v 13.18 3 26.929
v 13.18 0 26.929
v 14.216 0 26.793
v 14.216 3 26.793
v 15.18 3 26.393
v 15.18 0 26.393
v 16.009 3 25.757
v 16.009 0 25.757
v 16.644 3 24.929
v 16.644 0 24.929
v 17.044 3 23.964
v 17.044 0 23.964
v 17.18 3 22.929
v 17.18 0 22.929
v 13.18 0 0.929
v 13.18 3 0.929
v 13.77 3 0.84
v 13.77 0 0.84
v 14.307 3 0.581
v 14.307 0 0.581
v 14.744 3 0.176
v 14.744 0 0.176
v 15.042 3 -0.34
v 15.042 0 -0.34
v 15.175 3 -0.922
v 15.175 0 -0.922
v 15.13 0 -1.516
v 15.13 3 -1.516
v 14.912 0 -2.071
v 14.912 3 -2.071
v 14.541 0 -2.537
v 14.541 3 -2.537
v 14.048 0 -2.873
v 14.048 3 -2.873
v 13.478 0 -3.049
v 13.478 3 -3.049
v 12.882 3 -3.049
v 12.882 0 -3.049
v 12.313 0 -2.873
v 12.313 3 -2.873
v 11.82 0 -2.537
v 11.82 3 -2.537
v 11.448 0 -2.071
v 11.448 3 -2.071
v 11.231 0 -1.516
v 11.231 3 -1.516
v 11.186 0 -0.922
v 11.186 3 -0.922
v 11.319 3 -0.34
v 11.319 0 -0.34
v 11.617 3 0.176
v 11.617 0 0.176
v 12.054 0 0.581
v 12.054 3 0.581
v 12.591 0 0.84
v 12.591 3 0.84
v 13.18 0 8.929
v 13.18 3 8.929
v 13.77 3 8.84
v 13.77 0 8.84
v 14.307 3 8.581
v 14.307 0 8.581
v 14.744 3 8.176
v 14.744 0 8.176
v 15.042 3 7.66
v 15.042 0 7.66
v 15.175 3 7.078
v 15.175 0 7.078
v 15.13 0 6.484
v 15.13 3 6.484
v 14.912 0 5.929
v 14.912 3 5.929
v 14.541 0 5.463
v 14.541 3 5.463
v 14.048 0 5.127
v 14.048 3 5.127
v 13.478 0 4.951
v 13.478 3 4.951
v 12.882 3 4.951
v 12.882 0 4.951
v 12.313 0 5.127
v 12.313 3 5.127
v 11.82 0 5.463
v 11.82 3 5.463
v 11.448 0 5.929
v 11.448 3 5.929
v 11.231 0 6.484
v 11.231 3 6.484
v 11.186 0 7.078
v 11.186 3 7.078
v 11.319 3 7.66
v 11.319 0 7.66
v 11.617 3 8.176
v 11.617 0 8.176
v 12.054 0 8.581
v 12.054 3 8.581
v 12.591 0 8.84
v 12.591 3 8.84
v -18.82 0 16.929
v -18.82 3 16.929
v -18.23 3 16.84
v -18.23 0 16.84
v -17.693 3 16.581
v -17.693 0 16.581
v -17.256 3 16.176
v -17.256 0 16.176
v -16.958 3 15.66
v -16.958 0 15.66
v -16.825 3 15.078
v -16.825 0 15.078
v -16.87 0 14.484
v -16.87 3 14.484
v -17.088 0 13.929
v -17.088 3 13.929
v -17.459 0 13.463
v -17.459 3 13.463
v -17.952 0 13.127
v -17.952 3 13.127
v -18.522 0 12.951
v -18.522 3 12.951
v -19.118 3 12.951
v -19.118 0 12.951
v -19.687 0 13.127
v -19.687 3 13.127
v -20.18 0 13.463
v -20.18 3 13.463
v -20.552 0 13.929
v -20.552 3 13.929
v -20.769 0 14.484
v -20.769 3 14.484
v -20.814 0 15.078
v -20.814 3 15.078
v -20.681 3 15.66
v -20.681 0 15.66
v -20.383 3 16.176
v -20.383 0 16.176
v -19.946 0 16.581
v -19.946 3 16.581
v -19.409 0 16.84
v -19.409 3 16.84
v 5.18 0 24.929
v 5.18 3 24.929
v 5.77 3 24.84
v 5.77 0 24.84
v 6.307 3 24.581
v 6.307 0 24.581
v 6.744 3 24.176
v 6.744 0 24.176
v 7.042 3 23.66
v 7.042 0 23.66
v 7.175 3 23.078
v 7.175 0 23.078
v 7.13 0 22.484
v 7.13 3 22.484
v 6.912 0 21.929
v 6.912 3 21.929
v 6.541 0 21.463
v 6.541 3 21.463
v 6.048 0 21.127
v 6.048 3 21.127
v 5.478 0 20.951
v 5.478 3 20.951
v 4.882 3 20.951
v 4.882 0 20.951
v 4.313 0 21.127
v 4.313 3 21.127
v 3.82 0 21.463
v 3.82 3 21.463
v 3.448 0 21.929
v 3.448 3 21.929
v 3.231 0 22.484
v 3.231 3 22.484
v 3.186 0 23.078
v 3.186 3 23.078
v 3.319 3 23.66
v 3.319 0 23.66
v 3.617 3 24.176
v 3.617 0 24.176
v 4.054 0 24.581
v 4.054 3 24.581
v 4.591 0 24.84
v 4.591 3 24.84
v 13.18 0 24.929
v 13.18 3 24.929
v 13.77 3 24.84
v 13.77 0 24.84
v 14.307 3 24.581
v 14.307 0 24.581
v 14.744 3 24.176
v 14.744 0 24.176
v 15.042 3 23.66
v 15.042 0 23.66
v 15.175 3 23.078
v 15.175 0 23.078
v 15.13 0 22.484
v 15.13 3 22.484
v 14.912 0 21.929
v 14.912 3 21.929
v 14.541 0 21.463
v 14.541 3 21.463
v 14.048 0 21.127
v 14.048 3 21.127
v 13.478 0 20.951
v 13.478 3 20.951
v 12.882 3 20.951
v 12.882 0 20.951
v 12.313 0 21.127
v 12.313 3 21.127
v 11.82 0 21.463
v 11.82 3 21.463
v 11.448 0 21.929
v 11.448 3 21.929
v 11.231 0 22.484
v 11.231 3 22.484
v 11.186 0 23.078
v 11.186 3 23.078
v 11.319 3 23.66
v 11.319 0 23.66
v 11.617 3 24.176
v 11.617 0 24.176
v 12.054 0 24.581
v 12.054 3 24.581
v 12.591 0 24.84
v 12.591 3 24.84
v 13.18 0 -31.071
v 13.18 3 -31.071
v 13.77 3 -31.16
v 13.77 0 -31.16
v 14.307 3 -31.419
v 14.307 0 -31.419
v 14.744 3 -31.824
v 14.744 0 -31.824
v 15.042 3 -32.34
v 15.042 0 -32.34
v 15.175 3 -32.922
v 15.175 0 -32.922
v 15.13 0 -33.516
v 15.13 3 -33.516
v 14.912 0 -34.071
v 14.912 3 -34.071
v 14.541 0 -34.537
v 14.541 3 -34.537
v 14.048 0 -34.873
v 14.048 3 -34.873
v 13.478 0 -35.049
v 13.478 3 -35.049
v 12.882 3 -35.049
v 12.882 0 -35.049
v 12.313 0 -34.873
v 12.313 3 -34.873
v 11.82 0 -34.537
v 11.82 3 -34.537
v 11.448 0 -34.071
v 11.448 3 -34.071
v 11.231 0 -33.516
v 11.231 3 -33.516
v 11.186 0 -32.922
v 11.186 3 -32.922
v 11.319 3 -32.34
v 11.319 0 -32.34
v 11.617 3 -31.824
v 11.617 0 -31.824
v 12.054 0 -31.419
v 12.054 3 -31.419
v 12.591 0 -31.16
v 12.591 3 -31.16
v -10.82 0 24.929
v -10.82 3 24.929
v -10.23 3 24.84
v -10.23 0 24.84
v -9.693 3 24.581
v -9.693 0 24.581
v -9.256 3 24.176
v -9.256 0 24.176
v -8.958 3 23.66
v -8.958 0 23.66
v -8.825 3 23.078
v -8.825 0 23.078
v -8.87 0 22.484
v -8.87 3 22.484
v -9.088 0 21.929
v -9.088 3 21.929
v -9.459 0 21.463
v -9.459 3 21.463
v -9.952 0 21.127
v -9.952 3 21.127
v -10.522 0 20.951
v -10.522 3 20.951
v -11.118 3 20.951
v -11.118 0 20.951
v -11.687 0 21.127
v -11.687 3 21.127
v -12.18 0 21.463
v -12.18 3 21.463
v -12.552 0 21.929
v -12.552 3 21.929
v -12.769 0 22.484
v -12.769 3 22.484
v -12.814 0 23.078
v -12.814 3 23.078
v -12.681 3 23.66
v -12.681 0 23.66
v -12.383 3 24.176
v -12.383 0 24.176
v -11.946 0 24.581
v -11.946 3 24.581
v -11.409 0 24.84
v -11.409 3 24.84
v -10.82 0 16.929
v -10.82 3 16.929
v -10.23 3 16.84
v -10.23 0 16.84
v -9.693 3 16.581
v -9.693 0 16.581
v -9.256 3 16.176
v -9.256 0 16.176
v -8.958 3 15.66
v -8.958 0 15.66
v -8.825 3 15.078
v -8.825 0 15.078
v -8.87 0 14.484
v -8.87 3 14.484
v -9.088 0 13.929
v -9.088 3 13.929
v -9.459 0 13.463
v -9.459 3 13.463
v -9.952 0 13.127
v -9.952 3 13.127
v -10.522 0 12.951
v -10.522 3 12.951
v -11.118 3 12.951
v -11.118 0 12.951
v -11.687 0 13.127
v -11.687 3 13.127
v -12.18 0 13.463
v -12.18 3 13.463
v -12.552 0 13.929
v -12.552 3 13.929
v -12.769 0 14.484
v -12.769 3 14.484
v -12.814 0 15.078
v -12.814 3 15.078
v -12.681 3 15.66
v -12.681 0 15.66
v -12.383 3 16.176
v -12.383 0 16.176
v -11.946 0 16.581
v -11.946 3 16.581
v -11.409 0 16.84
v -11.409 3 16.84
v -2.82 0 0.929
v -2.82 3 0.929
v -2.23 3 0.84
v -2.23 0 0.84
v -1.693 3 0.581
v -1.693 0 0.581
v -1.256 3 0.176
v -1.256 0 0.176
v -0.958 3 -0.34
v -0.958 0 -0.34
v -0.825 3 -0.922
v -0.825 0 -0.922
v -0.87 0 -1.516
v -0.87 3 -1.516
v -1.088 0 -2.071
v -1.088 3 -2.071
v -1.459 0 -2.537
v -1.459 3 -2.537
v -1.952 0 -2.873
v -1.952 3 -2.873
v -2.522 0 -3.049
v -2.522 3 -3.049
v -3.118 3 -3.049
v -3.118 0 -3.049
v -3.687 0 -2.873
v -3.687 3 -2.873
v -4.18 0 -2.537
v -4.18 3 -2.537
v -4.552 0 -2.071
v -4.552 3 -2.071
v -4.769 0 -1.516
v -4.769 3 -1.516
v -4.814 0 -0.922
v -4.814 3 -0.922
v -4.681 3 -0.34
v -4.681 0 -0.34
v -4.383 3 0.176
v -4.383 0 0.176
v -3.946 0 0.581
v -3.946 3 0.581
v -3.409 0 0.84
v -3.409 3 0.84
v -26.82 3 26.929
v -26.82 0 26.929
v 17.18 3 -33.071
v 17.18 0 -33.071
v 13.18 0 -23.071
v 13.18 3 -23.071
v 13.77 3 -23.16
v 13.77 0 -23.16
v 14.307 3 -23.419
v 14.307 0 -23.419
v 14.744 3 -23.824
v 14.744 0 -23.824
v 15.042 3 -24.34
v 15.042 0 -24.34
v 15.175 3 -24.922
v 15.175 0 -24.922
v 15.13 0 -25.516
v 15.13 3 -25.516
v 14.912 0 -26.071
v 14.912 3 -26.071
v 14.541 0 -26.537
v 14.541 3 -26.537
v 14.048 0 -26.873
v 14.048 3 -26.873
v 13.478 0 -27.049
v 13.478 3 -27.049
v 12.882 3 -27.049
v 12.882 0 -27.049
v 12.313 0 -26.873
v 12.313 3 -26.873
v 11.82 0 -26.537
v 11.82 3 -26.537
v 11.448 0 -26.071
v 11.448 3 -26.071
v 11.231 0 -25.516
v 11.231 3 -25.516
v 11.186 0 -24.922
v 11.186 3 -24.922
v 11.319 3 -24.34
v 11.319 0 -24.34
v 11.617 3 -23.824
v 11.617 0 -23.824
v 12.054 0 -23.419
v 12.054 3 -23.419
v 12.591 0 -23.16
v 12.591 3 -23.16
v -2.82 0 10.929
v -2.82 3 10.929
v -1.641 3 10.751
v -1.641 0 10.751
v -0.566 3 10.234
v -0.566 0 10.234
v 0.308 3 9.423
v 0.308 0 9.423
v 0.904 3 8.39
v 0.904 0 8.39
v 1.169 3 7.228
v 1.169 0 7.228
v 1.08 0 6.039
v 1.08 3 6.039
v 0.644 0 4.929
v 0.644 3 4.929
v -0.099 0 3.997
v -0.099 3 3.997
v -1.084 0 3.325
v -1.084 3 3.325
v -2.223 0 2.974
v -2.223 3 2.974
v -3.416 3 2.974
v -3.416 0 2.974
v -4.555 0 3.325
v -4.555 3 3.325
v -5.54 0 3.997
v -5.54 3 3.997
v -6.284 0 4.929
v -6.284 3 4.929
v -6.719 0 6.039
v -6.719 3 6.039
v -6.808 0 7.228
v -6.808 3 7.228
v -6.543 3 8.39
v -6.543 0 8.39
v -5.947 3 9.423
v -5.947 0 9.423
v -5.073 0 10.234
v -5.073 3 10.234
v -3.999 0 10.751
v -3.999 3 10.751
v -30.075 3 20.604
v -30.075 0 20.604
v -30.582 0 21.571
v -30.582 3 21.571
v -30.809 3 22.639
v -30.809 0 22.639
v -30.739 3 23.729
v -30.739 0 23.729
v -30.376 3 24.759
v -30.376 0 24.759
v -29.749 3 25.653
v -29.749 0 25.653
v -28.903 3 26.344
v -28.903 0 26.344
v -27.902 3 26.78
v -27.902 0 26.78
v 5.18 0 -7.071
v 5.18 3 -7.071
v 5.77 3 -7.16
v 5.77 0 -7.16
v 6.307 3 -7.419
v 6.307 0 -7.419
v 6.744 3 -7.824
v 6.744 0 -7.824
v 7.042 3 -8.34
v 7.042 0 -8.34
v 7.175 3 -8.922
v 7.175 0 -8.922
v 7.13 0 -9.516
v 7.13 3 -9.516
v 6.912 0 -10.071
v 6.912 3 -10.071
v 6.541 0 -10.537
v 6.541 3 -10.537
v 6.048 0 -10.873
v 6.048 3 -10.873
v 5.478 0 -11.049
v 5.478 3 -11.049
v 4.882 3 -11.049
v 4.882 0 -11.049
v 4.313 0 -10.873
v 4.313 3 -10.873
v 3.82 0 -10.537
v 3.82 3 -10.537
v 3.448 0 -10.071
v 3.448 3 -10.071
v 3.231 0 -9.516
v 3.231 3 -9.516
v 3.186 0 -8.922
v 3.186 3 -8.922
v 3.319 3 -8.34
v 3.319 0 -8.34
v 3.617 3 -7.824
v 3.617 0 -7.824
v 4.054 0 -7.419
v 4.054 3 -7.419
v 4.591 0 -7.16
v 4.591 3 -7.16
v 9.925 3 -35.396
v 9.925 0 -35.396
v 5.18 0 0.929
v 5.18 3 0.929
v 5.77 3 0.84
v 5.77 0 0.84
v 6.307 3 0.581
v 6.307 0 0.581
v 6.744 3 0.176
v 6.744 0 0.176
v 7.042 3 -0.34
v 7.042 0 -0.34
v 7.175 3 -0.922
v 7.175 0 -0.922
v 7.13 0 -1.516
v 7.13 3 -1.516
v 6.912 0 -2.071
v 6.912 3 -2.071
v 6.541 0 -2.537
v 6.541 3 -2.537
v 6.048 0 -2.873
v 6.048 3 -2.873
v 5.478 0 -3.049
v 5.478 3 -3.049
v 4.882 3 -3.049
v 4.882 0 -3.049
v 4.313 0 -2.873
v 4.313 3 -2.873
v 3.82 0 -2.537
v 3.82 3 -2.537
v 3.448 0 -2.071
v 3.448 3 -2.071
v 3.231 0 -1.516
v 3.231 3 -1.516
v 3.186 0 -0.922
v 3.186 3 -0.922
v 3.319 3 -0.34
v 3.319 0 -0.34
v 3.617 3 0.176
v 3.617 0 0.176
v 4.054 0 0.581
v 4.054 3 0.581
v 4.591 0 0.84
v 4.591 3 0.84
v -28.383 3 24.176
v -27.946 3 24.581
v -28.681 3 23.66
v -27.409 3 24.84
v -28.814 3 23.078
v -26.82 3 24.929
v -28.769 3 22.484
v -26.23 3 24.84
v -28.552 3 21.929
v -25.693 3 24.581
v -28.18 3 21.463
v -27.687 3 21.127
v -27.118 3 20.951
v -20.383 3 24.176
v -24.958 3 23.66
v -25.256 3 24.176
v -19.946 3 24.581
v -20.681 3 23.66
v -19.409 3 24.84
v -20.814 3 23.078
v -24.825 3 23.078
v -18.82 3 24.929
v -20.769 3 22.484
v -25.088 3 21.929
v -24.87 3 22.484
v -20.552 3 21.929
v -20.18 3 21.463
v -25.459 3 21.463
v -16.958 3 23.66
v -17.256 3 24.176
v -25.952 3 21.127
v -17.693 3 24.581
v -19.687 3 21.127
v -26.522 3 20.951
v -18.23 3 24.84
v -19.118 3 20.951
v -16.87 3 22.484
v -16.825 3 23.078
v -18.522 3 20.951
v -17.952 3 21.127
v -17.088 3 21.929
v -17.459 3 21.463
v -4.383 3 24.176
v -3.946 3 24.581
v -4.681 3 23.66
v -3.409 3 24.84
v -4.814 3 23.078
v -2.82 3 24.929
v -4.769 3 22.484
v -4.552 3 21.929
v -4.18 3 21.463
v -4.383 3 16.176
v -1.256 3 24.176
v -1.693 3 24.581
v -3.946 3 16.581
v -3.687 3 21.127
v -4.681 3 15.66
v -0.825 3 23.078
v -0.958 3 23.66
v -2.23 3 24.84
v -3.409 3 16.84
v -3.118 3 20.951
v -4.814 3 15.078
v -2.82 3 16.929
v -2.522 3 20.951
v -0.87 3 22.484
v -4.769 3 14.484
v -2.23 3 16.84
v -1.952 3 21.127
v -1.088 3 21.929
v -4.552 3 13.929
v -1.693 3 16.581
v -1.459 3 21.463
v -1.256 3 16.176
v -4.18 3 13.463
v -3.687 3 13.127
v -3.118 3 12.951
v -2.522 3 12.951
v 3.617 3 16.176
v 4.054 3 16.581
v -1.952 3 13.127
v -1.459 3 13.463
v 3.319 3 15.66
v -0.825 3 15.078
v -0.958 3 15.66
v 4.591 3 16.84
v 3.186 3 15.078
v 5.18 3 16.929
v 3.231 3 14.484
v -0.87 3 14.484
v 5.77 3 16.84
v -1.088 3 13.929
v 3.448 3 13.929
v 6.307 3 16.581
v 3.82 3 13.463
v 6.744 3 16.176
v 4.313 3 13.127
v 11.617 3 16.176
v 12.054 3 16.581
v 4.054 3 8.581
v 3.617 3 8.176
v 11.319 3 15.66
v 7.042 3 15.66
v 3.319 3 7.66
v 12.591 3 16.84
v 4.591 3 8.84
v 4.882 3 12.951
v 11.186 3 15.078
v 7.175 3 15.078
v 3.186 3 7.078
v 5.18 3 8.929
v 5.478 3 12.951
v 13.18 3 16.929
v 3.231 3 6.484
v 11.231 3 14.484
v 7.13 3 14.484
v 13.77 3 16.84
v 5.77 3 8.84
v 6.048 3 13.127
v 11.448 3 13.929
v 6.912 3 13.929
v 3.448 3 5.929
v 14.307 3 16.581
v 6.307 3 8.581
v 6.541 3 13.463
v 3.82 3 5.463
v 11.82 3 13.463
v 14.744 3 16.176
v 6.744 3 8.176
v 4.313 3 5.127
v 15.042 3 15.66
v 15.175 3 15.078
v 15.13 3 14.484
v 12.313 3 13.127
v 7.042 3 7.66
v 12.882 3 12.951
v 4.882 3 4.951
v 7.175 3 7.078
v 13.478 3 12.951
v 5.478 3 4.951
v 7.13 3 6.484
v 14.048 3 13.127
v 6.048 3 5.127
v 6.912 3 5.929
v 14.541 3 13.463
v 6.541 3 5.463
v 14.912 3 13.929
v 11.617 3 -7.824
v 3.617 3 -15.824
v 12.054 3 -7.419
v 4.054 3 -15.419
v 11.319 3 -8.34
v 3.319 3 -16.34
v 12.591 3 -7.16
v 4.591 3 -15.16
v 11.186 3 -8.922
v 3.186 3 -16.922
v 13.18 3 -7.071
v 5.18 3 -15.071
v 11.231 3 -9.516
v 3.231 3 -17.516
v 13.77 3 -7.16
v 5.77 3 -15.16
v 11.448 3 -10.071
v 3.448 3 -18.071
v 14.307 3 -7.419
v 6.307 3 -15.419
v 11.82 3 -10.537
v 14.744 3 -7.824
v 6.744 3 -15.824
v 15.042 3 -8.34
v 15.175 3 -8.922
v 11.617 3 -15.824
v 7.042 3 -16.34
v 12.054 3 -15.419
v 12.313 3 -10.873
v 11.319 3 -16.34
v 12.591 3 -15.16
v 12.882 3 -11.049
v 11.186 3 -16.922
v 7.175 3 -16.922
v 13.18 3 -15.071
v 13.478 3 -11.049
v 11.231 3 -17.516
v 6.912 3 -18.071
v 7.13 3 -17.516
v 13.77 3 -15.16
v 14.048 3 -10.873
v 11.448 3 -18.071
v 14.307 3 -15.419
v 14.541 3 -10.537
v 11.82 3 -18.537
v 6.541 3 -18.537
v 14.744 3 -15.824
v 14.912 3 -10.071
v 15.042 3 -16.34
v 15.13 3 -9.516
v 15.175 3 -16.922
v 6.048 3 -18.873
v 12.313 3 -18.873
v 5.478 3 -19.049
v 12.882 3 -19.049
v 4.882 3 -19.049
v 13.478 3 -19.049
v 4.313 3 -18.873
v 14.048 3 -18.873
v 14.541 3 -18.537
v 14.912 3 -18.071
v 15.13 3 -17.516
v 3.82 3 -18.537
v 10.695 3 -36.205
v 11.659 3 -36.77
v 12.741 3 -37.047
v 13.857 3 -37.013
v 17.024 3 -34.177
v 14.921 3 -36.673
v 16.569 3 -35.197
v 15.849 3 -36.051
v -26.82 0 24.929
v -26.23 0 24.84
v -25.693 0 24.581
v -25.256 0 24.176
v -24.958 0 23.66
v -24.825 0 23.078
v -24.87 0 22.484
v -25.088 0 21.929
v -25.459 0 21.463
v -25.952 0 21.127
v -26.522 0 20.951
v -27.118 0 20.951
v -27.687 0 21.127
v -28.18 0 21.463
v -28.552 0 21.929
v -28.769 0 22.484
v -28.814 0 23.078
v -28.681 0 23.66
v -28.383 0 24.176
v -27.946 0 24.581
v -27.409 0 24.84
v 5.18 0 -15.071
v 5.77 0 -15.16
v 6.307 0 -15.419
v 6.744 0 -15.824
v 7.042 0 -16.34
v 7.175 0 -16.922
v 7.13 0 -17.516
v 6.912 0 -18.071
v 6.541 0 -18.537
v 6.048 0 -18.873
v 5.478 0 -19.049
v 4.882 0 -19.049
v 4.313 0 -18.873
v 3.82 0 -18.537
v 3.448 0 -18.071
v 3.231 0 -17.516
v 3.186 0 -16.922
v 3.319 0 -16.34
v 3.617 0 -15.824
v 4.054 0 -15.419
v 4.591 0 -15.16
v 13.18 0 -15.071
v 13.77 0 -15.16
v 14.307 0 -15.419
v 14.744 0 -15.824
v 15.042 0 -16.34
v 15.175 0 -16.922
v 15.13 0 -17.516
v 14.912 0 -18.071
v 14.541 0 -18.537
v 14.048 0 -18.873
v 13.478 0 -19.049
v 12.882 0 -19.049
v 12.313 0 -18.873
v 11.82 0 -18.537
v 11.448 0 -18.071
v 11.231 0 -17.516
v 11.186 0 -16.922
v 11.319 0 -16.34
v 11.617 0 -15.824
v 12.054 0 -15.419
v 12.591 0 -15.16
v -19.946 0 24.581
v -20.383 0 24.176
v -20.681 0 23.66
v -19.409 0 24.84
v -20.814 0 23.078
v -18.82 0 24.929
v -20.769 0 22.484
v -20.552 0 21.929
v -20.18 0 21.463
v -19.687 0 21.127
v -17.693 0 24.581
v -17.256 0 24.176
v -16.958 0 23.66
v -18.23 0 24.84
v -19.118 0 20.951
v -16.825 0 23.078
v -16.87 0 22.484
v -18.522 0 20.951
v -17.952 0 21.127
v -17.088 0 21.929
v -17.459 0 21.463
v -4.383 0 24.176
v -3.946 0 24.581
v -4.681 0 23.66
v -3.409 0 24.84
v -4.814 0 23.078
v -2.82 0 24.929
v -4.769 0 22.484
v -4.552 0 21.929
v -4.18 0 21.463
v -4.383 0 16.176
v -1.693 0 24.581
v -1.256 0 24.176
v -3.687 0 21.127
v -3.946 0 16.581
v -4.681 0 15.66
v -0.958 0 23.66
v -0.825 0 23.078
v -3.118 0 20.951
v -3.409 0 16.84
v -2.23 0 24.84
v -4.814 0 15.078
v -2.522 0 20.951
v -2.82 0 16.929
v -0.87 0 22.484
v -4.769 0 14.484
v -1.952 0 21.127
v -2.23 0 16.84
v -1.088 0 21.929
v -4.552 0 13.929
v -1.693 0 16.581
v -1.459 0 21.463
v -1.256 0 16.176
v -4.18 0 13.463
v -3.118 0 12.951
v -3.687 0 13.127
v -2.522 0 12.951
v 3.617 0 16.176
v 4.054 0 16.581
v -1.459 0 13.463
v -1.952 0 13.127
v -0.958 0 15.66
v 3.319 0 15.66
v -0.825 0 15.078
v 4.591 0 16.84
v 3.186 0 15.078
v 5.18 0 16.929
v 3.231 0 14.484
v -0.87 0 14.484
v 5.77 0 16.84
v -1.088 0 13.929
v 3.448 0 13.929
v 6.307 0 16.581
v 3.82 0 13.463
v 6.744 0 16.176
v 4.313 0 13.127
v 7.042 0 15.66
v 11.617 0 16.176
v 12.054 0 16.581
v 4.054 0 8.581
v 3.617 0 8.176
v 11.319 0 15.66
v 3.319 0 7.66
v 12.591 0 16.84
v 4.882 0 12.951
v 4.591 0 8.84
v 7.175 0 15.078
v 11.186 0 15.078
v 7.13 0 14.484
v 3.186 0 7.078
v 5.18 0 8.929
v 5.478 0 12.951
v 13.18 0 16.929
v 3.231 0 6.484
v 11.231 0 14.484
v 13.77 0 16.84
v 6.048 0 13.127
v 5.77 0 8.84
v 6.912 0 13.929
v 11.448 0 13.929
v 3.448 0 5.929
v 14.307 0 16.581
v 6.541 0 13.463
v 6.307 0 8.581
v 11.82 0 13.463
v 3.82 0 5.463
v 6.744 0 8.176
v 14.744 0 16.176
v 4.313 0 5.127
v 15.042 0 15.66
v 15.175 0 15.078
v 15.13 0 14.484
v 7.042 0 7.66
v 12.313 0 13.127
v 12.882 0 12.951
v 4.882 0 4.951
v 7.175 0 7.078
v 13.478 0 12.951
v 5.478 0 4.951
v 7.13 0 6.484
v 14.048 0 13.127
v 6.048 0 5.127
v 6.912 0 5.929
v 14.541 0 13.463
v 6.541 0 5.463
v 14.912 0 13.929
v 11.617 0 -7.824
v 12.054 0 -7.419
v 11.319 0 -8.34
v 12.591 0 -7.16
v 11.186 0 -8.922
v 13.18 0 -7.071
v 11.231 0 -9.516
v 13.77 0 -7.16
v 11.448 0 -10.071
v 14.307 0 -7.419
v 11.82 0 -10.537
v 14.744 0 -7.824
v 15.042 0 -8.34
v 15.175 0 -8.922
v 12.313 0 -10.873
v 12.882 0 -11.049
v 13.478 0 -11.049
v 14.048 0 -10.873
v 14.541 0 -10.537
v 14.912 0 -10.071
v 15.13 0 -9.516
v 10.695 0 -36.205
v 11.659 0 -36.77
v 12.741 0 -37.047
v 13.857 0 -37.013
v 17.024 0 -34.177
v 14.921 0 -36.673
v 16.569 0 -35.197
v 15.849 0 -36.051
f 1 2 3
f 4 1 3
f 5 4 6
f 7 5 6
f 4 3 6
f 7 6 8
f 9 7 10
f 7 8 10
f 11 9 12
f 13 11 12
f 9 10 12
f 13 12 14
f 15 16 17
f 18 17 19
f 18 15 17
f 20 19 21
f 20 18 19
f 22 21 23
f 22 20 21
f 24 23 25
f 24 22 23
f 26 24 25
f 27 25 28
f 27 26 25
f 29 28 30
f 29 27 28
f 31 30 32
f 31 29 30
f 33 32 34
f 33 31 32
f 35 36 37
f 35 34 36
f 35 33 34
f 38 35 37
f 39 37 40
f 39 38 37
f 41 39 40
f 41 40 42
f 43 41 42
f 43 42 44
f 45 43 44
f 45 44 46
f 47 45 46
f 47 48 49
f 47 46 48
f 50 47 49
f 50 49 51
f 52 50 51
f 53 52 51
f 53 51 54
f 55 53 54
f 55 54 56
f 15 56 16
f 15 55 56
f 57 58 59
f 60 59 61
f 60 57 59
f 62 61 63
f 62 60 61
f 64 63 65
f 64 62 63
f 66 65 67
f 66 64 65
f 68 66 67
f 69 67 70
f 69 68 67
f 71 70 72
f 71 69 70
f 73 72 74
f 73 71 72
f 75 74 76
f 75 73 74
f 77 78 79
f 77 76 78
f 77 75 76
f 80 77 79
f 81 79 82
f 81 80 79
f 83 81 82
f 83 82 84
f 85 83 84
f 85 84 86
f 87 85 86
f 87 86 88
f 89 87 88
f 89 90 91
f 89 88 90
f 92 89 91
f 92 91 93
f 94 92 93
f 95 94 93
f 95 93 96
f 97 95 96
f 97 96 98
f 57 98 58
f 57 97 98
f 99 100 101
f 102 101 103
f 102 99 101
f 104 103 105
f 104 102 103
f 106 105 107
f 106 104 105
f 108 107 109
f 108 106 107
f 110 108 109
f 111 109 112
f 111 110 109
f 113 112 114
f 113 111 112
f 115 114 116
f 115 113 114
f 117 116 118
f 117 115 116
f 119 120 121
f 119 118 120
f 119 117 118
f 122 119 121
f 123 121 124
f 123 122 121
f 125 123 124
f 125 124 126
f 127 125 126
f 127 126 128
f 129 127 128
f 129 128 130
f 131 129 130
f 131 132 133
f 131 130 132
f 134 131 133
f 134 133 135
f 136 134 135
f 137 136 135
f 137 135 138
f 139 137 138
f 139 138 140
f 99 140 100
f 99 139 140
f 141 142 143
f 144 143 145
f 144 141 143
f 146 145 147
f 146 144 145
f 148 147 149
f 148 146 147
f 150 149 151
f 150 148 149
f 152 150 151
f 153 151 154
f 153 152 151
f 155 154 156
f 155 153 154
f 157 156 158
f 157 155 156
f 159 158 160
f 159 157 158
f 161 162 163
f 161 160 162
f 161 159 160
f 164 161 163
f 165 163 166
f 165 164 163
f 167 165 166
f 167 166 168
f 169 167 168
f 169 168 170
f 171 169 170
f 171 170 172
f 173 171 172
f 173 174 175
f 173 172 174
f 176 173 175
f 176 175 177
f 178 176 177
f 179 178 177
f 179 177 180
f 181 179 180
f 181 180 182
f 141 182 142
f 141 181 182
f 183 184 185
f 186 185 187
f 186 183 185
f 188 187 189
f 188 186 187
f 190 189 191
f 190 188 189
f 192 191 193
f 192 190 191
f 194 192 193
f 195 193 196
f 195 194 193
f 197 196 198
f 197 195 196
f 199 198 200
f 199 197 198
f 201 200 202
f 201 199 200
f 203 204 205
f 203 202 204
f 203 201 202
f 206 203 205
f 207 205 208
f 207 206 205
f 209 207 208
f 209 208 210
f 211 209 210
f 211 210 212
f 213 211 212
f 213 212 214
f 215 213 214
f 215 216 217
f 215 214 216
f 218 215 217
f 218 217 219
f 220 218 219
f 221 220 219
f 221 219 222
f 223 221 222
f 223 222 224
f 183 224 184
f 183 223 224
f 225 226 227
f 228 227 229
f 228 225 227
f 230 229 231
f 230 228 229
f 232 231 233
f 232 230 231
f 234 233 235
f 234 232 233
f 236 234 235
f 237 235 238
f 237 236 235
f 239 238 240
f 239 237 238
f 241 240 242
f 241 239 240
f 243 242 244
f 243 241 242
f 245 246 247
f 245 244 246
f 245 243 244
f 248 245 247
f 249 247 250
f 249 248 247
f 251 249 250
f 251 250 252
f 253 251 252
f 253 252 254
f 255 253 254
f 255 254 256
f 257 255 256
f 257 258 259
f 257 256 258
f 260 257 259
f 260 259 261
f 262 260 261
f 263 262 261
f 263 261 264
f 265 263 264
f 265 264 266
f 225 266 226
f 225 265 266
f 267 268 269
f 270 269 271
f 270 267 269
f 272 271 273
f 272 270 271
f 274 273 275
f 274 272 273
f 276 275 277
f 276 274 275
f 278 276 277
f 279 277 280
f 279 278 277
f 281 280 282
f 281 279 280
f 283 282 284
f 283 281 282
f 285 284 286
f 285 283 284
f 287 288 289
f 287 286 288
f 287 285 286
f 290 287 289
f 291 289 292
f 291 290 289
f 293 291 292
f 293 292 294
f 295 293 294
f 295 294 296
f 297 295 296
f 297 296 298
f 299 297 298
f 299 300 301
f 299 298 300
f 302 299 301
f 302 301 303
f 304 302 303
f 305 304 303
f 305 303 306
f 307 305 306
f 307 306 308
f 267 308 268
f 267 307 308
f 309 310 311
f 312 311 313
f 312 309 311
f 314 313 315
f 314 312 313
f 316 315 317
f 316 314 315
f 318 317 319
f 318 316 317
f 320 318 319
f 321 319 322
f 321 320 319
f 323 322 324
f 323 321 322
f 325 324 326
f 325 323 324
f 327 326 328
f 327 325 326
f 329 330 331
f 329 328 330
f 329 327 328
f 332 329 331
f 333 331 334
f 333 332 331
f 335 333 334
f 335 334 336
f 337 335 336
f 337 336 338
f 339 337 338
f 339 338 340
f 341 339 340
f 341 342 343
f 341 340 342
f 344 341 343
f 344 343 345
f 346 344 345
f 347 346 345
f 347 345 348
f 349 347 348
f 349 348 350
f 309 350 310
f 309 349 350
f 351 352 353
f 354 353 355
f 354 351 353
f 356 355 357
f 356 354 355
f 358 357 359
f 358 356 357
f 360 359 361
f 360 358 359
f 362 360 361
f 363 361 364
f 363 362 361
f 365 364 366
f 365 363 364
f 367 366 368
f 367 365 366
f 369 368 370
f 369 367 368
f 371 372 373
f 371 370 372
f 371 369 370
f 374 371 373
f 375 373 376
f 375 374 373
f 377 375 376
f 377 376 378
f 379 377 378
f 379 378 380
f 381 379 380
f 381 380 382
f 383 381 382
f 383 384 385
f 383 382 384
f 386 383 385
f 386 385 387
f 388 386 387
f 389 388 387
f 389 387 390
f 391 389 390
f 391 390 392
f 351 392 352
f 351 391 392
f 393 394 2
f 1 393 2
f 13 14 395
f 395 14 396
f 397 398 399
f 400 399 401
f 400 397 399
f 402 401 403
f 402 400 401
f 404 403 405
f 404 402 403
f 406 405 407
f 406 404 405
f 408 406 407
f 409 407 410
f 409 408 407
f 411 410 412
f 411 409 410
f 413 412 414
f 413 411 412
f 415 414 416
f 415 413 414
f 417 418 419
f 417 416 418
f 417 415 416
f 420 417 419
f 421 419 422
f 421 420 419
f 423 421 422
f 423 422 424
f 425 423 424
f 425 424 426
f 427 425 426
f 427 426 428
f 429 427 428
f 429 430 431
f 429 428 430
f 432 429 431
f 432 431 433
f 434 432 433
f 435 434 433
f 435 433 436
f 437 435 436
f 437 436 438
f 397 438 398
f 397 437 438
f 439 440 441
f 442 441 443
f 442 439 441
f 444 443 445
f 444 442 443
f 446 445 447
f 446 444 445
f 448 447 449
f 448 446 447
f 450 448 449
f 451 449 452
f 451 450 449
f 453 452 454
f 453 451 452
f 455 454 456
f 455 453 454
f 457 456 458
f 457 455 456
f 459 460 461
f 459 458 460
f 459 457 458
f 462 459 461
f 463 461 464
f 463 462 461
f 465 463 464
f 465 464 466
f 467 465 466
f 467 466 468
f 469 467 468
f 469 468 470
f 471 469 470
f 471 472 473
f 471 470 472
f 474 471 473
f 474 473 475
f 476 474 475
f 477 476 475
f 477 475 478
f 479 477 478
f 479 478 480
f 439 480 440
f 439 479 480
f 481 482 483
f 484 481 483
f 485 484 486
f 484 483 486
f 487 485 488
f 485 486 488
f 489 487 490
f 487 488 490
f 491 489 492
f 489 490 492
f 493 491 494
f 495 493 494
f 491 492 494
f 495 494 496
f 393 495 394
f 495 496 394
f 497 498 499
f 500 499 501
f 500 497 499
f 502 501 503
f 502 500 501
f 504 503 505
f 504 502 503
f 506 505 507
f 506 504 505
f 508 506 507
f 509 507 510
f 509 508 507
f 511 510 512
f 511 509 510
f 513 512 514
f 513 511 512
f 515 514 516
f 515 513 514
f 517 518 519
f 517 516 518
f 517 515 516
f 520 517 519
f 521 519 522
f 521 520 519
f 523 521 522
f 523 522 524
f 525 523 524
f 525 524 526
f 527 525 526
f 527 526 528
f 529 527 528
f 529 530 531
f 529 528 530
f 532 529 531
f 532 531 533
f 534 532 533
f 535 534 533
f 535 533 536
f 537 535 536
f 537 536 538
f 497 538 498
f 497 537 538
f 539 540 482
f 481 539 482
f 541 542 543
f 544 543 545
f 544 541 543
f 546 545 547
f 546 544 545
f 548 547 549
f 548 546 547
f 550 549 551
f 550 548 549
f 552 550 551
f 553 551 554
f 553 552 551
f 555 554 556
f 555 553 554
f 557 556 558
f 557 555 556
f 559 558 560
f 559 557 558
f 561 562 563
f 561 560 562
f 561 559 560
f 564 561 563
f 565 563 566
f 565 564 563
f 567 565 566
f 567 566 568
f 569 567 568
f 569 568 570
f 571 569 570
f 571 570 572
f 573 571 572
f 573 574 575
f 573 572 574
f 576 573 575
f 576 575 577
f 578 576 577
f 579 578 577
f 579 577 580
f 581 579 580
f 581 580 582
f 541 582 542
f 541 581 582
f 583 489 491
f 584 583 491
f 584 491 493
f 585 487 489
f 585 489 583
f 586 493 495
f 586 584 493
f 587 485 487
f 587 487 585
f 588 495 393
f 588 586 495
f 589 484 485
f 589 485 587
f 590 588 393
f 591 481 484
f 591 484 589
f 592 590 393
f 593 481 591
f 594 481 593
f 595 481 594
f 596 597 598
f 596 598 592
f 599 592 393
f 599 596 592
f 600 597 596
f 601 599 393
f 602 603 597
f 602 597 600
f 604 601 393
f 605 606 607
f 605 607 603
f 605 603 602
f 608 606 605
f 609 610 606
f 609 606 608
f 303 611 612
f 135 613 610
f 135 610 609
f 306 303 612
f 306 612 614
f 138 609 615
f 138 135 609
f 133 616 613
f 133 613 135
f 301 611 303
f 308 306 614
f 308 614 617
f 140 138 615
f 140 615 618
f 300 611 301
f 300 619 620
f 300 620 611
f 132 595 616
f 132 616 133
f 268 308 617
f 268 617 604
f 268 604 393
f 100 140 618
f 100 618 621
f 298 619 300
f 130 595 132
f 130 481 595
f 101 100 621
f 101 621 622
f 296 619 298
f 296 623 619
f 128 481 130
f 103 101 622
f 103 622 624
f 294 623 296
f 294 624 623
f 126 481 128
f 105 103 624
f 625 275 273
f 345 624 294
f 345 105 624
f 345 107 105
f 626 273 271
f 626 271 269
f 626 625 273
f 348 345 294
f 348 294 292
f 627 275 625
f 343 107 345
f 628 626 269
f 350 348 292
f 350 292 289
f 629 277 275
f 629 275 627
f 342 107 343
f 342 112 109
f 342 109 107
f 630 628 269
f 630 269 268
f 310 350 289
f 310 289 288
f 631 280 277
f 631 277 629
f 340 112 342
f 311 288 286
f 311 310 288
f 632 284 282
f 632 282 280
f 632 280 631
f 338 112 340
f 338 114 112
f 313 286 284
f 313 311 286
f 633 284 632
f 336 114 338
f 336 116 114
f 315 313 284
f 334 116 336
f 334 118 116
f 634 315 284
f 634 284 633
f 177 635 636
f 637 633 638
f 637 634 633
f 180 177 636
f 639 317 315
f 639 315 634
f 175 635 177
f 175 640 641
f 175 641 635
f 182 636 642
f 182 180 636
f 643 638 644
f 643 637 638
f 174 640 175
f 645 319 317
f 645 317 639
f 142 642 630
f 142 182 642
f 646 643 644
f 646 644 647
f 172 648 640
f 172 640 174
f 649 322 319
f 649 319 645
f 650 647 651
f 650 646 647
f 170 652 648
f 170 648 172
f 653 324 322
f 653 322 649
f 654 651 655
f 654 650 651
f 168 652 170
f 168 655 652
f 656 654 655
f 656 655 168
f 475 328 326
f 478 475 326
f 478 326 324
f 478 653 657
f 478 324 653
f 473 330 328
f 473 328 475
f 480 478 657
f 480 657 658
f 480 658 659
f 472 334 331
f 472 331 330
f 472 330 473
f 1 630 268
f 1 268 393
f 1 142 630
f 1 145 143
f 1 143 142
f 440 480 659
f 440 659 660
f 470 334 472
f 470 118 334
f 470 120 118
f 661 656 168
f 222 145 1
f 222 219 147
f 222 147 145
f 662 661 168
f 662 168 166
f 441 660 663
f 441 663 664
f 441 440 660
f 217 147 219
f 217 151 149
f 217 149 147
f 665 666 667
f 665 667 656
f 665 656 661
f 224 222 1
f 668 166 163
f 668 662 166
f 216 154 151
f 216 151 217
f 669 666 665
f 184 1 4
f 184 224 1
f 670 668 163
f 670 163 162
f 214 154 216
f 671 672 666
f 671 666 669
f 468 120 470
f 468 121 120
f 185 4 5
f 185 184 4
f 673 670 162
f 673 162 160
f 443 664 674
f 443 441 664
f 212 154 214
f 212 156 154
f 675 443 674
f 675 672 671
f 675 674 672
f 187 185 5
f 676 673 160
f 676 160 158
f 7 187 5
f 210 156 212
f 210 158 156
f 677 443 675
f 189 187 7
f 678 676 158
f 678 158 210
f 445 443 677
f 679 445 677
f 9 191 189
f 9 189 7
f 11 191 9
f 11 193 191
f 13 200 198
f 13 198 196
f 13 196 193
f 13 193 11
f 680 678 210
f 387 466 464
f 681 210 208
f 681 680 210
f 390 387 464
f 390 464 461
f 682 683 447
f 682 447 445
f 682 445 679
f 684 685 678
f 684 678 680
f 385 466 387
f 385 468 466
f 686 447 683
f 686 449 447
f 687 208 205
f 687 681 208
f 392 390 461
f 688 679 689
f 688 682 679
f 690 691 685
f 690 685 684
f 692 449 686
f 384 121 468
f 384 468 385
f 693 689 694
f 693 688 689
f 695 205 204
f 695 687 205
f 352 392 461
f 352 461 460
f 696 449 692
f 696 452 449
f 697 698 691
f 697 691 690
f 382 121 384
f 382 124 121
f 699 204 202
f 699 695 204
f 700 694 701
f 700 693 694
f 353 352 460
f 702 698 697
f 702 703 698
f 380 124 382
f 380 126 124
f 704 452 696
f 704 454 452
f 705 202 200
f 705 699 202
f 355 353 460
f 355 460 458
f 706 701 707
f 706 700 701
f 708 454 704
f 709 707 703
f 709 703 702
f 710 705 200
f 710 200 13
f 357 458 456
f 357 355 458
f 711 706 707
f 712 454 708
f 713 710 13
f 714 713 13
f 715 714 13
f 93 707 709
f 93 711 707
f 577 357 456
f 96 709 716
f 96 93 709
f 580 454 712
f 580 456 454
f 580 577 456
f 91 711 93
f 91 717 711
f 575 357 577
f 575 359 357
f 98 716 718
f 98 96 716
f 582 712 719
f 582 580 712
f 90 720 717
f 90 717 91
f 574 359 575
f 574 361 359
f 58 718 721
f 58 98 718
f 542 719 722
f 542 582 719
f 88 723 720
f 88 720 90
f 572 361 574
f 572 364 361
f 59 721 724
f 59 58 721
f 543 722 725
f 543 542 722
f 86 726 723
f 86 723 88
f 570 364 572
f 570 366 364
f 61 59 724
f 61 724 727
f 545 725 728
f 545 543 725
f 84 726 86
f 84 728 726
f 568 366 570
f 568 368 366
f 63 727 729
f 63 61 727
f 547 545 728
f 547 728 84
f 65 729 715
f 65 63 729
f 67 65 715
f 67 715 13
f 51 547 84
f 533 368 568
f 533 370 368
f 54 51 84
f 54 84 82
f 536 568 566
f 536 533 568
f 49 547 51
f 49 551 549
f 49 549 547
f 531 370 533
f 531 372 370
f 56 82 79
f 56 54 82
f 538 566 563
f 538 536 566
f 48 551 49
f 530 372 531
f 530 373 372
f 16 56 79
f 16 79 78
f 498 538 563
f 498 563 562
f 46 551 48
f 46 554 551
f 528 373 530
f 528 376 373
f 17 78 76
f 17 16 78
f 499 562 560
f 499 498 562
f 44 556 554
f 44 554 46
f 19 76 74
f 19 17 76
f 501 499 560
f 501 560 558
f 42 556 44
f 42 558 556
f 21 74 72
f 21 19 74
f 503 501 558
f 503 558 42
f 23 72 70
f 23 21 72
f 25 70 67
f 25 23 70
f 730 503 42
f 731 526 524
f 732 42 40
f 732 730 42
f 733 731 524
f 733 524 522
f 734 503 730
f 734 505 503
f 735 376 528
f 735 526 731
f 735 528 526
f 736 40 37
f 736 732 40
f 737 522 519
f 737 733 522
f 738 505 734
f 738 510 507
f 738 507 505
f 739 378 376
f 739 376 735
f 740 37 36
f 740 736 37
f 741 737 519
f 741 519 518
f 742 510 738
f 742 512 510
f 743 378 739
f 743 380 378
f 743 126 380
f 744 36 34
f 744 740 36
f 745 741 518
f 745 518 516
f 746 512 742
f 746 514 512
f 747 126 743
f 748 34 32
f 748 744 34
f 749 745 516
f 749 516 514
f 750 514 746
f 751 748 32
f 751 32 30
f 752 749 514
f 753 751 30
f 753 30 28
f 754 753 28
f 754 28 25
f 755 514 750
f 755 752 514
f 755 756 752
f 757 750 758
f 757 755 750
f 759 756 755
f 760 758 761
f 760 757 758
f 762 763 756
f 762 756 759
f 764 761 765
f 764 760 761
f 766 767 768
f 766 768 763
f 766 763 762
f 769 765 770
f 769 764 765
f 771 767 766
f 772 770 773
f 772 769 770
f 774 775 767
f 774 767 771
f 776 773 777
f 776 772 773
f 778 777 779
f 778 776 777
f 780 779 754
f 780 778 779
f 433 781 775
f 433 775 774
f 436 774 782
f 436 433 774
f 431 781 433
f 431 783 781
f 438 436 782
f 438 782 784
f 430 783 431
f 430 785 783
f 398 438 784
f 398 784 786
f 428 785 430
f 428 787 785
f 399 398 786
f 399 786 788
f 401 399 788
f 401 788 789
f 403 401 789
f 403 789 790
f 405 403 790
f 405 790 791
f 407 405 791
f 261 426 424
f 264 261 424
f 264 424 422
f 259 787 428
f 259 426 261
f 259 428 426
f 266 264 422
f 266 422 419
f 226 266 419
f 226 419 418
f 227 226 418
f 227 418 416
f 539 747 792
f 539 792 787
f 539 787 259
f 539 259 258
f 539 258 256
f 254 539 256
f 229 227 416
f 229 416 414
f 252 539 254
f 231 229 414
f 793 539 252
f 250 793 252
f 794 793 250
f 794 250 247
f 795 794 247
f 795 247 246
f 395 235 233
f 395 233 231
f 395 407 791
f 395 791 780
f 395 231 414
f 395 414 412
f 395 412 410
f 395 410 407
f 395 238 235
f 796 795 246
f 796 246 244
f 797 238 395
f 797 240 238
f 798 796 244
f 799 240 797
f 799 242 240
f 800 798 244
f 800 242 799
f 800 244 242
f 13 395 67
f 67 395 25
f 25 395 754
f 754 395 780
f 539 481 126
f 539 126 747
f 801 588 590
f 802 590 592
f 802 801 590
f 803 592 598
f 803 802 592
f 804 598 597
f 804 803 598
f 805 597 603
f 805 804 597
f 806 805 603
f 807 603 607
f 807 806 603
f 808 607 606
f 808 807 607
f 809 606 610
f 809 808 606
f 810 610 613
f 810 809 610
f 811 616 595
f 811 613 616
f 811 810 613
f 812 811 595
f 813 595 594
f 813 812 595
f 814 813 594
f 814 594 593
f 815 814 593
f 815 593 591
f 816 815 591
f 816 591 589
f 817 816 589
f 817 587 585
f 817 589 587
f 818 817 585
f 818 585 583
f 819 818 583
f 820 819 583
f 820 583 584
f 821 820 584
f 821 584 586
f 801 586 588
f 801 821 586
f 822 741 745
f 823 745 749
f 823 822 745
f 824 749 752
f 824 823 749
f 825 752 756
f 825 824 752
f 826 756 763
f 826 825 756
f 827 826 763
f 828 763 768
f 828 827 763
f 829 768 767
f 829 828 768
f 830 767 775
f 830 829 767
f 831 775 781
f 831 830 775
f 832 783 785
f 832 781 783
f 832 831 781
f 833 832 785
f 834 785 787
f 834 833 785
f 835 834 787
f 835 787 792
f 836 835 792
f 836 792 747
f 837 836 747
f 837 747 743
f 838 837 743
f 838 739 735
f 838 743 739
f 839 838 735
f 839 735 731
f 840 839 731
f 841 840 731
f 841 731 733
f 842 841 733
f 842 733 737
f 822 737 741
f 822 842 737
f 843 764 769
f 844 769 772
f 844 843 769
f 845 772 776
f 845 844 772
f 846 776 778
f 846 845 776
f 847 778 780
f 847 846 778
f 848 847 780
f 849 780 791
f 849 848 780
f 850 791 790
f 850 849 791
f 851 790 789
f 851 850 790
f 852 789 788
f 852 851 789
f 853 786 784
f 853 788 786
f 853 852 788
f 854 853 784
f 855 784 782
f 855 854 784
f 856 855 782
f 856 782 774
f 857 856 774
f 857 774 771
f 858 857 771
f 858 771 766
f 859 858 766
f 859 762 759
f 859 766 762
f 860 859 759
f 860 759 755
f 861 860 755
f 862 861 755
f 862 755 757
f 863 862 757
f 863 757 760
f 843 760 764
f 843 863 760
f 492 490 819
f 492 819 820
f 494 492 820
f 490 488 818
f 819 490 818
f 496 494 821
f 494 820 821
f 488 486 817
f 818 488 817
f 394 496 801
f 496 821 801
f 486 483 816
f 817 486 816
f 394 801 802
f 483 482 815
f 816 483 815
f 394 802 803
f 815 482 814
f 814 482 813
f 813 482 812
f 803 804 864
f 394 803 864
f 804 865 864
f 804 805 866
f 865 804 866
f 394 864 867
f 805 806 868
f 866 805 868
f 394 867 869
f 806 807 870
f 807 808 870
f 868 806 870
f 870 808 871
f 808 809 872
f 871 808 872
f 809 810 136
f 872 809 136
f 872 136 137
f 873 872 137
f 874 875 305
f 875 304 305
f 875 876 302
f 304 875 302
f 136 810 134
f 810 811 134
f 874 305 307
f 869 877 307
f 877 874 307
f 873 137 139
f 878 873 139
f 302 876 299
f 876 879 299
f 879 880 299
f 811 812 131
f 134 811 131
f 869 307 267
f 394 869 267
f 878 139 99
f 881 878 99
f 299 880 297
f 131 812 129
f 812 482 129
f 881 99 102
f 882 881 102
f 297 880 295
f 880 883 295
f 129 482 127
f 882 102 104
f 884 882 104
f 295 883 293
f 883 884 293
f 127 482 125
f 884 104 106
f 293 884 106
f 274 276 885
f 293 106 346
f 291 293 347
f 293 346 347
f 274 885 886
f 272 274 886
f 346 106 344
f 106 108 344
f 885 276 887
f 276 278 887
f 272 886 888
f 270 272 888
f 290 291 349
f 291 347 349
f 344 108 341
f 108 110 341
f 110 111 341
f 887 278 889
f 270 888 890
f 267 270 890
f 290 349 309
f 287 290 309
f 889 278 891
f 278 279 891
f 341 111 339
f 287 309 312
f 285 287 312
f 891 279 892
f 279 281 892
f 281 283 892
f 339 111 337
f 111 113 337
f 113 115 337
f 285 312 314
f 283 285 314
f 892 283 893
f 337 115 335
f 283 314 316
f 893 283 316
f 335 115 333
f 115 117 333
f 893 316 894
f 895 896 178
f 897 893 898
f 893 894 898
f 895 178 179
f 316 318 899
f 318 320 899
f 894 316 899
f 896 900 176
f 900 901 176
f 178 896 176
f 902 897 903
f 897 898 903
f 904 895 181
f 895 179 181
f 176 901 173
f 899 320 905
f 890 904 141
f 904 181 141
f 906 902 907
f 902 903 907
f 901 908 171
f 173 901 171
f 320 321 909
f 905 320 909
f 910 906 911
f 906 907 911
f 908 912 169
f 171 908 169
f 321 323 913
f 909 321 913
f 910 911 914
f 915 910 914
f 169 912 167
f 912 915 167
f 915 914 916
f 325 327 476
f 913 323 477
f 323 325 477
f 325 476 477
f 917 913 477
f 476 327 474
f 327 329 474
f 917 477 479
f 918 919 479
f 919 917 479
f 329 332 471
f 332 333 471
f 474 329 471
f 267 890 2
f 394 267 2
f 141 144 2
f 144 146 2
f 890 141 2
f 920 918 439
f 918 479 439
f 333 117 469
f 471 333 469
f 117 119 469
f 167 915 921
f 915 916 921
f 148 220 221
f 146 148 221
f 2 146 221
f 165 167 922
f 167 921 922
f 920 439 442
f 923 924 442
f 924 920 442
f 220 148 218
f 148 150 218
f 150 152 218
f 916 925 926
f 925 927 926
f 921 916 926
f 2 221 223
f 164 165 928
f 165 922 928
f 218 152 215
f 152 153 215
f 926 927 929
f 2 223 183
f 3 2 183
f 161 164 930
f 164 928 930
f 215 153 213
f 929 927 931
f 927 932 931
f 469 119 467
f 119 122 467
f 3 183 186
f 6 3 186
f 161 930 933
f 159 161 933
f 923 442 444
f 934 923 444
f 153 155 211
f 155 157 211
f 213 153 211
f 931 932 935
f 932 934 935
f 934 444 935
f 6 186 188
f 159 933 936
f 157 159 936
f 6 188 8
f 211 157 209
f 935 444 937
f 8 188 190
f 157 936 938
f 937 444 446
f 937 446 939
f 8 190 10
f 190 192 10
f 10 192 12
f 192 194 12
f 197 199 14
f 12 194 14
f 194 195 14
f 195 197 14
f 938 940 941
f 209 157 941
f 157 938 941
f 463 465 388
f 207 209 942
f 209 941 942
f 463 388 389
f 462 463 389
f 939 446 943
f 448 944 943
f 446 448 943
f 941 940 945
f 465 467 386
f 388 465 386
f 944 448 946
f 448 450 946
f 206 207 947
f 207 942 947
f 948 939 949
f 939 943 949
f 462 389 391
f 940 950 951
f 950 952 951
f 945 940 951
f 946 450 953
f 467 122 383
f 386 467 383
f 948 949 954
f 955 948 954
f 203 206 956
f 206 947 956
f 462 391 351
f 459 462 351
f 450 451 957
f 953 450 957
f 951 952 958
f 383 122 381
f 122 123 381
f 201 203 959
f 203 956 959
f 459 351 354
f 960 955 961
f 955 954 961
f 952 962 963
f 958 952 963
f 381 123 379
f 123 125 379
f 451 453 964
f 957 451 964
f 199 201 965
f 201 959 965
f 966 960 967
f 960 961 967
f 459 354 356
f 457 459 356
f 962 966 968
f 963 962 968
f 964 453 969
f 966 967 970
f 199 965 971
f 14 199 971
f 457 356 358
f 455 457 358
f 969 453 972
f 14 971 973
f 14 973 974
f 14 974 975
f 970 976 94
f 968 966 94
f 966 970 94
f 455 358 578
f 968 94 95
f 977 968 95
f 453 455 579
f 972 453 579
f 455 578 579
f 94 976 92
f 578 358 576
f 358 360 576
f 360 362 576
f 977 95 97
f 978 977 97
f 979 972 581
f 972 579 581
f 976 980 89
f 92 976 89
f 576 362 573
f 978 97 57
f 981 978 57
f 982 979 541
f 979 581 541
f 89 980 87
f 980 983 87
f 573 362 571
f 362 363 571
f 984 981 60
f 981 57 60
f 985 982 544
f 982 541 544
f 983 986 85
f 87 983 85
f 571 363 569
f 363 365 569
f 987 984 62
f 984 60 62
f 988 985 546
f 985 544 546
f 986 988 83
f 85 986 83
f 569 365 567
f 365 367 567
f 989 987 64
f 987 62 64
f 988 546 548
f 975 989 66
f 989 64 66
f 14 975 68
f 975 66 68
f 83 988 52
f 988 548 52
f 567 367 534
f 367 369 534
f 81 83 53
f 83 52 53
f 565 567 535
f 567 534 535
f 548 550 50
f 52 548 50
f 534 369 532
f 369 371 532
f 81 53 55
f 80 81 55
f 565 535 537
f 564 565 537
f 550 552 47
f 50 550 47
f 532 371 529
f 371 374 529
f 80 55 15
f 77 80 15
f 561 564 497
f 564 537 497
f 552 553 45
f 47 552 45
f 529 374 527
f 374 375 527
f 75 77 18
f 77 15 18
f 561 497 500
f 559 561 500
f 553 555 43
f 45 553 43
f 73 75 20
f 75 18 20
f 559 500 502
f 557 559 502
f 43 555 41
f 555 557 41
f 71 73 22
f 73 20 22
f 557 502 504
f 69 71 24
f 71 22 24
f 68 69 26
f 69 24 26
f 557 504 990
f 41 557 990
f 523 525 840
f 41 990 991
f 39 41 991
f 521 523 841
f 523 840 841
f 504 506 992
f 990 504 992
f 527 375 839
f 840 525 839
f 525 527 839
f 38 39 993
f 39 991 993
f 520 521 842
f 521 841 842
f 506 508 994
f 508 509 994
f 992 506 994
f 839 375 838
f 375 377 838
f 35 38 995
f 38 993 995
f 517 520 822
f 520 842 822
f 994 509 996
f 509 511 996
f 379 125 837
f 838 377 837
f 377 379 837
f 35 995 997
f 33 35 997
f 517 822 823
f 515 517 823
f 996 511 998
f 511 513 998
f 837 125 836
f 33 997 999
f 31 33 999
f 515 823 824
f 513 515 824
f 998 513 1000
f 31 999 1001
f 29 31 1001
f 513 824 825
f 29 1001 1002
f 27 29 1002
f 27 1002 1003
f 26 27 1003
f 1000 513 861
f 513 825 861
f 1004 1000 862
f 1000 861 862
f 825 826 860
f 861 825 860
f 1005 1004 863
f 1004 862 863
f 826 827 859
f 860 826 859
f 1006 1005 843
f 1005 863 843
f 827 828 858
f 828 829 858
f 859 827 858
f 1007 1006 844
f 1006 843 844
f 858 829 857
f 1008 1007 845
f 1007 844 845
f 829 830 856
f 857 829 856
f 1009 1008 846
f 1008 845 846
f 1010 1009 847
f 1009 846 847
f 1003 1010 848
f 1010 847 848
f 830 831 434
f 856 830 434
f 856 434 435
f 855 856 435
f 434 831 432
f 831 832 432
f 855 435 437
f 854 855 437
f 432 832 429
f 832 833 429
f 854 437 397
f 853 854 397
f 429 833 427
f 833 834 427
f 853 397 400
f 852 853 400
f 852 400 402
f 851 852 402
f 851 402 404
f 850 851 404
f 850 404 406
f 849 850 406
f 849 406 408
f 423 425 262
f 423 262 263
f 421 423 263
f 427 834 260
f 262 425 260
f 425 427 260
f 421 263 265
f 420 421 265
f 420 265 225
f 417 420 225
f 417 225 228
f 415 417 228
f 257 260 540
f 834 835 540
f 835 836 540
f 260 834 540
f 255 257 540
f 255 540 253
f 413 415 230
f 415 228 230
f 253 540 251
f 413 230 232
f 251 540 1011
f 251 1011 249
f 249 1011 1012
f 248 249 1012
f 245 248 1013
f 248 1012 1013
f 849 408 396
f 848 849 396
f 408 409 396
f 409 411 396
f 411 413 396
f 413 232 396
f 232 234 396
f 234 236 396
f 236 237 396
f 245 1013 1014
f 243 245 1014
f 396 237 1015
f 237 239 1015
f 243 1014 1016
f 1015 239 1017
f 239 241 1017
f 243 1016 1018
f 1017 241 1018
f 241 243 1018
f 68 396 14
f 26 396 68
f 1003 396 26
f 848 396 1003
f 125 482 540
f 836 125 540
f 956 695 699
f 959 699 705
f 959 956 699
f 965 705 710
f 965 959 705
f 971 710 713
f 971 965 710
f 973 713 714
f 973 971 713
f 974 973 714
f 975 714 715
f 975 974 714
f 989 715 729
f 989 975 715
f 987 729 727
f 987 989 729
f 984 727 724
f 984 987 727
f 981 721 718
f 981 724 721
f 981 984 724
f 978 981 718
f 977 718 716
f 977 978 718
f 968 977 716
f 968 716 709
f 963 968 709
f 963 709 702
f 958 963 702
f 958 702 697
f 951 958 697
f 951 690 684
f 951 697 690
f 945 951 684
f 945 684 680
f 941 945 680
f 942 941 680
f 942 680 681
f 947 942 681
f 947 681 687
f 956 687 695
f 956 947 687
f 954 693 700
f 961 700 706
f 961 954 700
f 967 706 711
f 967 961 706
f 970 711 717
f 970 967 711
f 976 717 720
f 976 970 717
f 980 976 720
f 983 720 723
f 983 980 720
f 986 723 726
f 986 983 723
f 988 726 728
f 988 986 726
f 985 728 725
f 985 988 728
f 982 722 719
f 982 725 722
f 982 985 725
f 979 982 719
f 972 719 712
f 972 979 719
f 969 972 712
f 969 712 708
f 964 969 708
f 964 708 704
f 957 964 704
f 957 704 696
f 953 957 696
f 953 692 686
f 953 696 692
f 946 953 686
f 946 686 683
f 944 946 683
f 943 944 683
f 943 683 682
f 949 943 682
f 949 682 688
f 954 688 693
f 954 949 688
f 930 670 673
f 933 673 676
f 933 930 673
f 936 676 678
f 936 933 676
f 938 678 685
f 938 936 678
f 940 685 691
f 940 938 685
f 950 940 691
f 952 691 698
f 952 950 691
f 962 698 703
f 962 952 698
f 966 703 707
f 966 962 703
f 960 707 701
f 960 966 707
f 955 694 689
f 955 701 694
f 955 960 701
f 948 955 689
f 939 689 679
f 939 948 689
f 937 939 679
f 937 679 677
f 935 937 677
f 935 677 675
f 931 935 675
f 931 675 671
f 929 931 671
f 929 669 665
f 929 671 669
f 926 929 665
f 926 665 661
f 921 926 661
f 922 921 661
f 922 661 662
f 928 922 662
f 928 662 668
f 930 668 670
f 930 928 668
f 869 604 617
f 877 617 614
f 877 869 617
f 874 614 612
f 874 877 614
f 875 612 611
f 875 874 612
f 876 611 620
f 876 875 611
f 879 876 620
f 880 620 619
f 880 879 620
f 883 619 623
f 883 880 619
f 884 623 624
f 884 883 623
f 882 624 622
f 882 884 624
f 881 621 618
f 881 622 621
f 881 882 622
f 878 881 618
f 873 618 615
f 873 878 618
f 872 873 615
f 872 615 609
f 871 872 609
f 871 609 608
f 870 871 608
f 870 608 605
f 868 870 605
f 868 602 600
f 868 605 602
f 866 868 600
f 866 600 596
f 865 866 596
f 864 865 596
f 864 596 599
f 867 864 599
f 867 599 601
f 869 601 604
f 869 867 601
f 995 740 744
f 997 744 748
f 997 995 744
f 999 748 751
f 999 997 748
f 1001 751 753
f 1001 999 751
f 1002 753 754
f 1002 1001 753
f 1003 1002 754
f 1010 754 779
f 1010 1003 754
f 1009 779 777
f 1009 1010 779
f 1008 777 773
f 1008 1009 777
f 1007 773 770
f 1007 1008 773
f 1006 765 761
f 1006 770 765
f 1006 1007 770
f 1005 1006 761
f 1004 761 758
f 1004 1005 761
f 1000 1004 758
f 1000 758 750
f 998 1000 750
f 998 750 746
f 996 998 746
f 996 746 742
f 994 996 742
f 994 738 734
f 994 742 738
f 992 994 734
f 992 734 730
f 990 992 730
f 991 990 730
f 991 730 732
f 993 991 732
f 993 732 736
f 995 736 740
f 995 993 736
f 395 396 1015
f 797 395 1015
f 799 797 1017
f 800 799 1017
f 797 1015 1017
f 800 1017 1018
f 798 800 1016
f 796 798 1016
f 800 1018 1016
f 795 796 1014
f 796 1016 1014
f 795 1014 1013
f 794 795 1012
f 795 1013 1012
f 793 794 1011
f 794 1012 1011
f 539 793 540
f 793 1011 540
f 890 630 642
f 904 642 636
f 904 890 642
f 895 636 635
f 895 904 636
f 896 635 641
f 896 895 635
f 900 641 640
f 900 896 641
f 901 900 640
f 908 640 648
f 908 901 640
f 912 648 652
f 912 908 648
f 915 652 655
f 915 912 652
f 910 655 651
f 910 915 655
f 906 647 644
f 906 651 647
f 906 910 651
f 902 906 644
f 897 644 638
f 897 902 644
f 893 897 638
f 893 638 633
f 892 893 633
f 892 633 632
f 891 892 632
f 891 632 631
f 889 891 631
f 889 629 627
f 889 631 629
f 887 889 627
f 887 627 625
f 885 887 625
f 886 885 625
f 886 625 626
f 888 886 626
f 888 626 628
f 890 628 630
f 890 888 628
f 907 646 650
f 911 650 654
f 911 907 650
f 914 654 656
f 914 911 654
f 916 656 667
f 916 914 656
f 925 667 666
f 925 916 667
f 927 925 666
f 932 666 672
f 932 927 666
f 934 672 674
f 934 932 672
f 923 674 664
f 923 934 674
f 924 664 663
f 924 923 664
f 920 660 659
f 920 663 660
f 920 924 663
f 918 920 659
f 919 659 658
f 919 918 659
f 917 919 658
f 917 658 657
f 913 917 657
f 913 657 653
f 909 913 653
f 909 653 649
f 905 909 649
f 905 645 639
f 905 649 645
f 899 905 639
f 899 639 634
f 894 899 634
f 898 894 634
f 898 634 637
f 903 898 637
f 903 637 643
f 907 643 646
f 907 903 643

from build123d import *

# Parameters (mm, degrees)
BOSS_EXTRUDE2_DEPTH = 3
SKETCH4_R           = 2
SKETCH4_R_2         = 4
CUT_EXTRUDE3_DEPTH  = 7


with BuildPart() as part:
    # Sketch2 → Boss-Extrude2 (new body)
    with BuildSketch(Plane(origin=(0, 0, 0), x_dir=(1, 0, 0), z_dir=(0, 1, 0))):
        with BuildLine():
            Line((17.180375272, -22.928844638), (17.180375272, 33.071155362))
            ThreePointArc((17.180375272, 33.071155362), (14.401084996, 36.880337397), (9.925441387, 35.396108137))
            Line((9.925441387, 35.396108137), (-30.074558613, -20.603891863))
            ThreePointArc((-30.074558613, -20.603891863), (-30.376295299, -24.759170961), (-26.819624728, -26.928844638))
            Line((-26.819624728, -26.928844638), (13.180375272, -26.928844638))
            ThreePointArc((13.180375272, -26.928844638), (16.008802397, -25.757271762), (17.180375272, -22.928844638))
        make_face()
    extrude(amount=BOSS_EXTRUDE2_DEPTH)

    # Sketch4 → Cut-Extrude3 (cut)
    with BuildSketch(Plane(origin=(0, 0, 0), x_dir=(1, 0, 0), z_dir=(0, 1, 0))):
        with Locations(Location((13.180375272, -22.928844638, 0), (0, 0, 270))):
            Circle(SKETCH4_R)
        with Locations(Location((13.180375272, -14.928844638, 0), (0, 0, 270))):
            Circle(SKETCH4_R)
        with Locations(Location((13.180375272, -6.928844638, 0), (0, 0, 270))):
            Circle(SKETCH4_R)
        with Locations(Location((13.180375272, 1.071155362, 0), (0, 0, 270))):
            Circle(SKETCH4_R)
        with Locations(Location((13.180375272, 9.071155362, 0), (0, 0, 270))):
            Circle(SKETCH4_R)
        with Locations(Location((13.180375272, 17.071155362, 0), (0, 0, 270))):
            Circle(SKETCH4_R)
        with Locations(Location((13.180375272, 25.071155362, 0), (0, 0, 270))):
            Circle(SKETCH4_R)
        with Locations(Location((13.180375272, 33.071155362, 0), (0, 0, 270))):
            Circle(SKETCH4_R)
        with Locations(Location((5.180375272, -22.928844638, 0), (0, 0, 270))):
            Circle(SKETCH4_R)
        with Locations(Location((-2.819624728, -22.928844638, 0), (0, 0, 270))):
            Circle(SKETCH4_R)
        with Locations(Location((-10.819624728, -22.928844638, 0), (0, 0, 270))):
            Circle(SKETCH4_R)
        with Locations(Location((-18.819624728, -22.928844638, 0), (0, 0, 270))):
            Circle(SKETCH4_R)
        with Locations(Location((-26.819624728, -22.928844638, 0), (0, 0, 270))):
            Circle(SKETCH4_R)
        with Locations(Location((-18.819624728, -14.928844638, 0), (0, 0, 270))):
            Circle(SKETCH4_R)
        with Locations(Location((-10.819624728, -14.928844638, 0), (0, 0, 270))):
            Circle(SKETCH4_R)
        with Locations(Location((-2.819624728, -14.928844638, 0), (0, 0, 270))):
            Circle(SKETCH4_R)
        with Locations(Location((5.180375272, -14.928844638, 0), (0, 0, 270))):
            Circle(SKETCH4_R)
        with Locations(Location((5.180375272, -6.928844638, 0), (0, 0, 270))):
            Circle(SKETCH4_R)
        with Locations(Location((5.180375272, 1.071155362, 0), (0, 0, 270))):
            Circle(SKETCH4_R)
        with Locations(Location((5.180375272, 9.071155362, 0), (0, 0, 270))):
            Circle(SKETCH4_R)
        with Locations(Location((5.180375272, 17.071155362, 0), (0, 0, 270))):
            Circle(SKETCH4_R)
        with Locations(Location((-2.819624728, 1.071155362, 0), (0, 0, 270))):
            Circle(SKETCH4_R)
        with Locations(Location((-2.819624728, -6.928844638, 0), (0, 0, 270))):
            Circle(SKETCH4_R_2)
    extrude(amount=CUT_EXTRUDE3_DEPTH, mode=Mode.SUBTRACT)


solid = part.part
